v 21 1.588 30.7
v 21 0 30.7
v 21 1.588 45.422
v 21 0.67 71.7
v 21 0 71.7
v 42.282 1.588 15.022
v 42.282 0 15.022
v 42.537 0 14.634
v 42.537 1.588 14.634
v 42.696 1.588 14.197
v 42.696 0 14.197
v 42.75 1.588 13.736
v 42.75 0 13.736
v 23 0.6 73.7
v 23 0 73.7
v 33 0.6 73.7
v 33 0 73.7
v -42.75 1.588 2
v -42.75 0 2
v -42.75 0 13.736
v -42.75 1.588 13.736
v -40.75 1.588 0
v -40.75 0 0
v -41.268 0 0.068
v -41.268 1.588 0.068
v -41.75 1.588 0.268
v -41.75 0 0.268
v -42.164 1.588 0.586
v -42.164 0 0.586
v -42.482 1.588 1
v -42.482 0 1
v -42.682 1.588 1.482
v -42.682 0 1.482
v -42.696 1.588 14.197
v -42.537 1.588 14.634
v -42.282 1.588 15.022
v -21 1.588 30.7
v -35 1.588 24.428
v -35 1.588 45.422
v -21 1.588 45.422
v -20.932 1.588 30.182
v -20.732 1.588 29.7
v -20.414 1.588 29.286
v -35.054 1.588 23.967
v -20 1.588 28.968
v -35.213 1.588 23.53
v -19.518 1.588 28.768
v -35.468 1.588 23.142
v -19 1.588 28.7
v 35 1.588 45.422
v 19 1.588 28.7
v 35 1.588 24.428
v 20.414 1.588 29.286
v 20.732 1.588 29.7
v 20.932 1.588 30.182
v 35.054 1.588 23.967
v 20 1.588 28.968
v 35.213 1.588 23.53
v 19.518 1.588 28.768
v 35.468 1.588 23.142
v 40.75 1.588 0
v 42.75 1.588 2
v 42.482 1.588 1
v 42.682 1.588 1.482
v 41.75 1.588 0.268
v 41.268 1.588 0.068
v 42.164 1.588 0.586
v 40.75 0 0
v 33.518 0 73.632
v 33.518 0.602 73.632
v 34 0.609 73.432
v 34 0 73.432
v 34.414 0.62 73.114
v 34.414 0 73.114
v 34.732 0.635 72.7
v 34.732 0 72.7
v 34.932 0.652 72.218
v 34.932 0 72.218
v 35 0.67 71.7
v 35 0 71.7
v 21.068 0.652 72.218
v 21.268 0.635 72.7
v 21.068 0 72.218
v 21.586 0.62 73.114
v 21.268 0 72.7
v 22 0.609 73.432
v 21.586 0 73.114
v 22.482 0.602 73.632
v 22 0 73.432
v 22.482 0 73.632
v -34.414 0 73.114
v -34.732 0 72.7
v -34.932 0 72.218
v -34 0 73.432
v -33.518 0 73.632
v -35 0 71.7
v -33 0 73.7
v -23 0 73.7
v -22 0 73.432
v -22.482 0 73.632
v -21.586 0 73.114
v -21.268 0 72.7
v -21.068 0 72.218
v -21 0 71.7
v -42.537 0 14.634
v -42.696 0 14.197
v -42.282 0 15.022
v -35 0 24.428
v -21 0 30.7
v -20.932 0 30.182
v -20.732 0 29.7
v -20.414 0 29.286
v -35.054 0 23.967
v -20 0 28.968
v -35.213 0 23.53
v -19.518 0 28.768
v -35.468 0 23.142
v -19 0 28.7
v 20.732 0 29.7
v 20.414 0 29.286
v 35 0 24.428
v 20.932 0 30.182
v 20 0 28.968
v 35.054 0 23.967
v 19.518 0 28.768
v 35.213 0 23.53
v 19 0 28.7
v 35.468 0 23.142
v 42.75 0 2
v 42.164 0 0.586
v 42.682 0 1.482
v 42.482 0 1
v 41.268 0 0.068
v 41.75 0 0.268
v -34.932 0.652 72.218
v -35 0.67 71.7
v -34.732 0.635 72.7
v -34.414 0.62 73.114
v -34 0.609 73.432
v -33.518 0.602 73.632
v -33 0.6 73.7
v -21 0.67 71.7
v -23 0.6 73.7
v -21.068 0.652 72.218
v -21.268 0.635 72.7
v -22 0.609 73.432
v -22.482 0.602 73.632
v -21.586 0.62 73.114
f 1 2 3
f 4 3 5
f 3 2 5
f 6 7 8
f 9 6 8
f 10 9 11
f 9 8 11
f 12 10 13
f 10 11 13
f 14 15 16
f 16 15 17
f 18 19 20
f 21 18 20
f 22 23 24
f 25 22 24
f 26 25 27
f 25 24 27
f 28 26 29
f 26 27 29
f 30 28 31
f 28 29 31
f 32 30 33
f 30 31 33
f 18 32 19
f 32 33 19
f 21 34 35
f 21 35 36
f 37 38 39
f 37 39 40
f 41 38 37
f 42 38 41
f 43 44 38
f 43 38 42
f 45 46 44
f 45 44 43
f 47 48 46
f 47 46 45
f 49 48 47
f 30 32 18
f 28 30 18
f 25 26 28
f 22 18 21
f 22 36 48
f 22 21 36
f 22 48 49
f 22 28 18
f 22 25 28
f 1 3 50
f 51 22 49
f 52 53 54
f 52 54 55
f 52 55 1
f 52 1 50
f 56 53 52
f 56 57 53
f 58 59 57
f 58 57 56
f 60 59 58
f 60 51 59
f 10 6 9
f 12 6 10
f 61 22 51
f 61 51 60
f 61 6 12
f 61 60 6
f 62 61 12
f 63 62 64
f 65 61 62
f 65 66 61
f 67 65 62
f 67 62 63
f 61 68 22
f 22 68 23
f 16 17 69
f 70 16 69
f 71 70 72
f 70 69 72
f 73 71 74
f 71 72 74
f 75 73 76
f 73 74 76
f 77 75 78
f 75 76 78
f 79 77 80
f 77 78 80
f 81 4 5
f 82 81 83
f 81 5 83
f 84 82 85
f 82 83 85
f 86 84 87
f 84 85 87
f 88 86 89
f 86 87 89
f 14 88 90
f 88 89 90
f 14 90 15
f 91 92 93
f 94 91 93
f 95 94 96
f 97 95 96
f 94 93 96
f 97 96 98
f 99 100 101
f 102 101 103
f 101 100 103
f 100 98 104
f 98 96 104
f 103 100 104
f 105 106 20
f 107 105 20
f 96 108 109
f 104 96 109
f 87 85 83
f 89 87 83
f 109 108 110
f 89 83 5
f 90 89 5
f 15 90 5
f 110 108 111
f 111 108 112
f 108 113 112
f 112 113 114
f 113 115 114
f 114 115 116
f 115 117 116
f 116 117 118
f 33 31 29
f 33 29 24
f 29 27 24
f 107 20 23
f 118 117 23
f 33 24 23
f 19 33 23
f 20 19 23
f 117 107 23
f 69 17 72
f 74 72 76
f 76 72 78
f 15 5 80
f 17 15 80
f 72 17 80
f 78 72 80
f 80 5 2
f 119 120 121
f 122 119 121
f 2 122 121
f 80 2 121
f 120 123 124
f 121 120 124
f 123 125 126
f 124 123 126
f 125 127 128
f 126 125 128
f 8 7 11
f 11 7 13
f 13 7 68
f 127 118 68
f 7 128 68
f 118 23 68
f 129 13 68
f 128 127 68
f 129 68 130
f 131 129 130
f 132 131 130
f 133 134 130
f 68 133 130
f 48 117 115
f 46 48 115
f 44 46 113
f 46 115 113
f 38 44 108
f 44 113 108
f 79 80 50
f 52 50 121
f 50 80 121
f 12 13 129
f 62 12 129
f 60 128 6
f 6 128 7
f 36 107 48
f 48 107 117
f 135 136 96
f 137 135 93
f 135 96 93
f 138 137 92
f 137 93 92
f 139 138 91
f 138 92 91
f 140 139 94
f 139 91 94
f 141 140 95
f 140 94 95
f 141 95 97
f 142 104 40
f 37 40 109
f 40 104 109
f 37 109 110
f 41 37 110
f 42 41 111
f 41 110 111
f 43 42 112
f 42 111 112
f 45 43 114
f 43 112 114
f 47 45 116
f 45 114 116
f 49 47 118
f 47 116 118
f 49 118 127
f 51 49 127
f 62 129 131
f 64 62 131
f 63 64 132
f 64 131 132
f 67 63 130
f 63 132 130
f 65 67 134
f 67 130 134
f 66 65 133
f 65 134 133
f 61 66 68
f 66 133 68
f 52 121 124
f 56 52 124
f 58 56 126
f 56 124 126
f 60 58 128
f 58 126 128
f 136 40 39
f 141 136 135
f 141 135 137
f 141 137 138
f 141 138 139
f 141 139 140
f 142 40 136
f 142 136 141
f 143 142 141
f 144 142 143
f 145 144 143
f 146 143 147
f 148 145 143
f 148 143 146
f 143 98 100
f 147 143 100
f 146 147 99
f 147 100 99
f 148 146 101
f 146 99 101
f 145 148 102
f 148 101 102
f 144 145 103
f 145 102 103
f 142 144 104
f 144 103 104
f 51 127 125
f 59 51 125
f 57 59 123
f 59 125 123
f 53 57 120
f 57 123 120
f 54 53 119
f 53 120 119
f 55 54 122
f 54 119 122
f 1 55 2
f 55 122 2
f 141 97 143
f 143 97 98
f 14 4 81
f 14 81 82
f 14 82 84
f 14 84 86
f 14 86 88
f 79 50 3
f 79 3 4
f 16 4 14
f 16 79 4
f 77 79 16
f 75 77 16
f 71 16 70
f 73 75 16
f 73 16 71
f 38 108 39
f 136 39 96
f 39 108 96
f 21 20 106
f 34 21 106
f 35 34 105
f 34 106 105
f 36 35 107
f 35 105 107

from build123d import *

# Parameters (mm, degrees)
BOSS_EXTRUDE1_DEPTH = 1.5875
CUT_EXTRUDE2_DEPTH  = 109.601439476


with BuildPart() as part:
    # Sketch1 → Boss-Extrude1 (new body)
    with BuildSketch(Plane(origin=(0, 0, 0), x_dir=(1, 0, 0), z_dir=(0, 1, 0))):
        with BuildLine():
            Line((-35, -24.427940469), (-35, -71.7))
            ThreePointArc((-35, -71.7), (-34.414213562, -73.114213562), (-33, -73.7))
            Line((-33, -73.7), (-23, -73.7))
            ThreePointArc((-23, -73.7), (-21.585786438, -73.114213562), (-21, -71.7))
            Line((-21, -71.7), (-21, -30.7))
            ThreePointArc((-21, -30.7), (-20.414213562, -29.285786438), (-19, -28.7))
            Line((-19, -28.7), (19, -28.7))
            ThreePointArc((19, -28.7), (20.414213562, -29.285786438), (21, -30.7))
            Line((21, -30.7), (21, -71.7))
            ThreePointArc((21, -71.7), (21.585786438, -73.114213562), (23, -73.7))
            Line((23, -73.7), (33, -73.7))
            ThreePointArc((33, -73.7), (34.414213562, -73.114213562), (35, -71.7))
            Line((35, -71.7), (35, -24.427940469))
            ThreePointArc((35, -24.427940469), (35.120614758, -23.743900182), (35.467911114, -23.142365249))
            Line((35.467911114, -23.142365249), (42.282088886, -15.021544408))
            ThreePointArc((42.282088886, -15.021544408), (42.629385242, -14.420009476), (42.75, -13.735969189))
            Line((42.75, -13.735969189), (42.75, -2))
            ThreePointArc((42.75, -2), (42.164213562, -0.585786438), (40.75, 0))
            Line((40.75, 0), (-40.75, 0))
            ThreePointArc((-40.75, 0), (-42.164213562, -0.585786438), (-42.75, -2))
            Line((-42.75, -2), (-42.75, -13.735969189))
            ThreePointArc((-42.75, -13.735969189), (-42.629385242, -14.420009476), (-42.282088886, -15.021544408))
            Line((-42.282088886, -15.021544408), (-35.467911114, -23.142365249))
            ThreePointArc((-35.467911114, -23.142365249), (-35.120614758, -23.743900182), (-35, -24.427940469))
        make_face()
    extrude(amount=BOSS_EXTRUDE1_DEPTH)

    # Sketch3 → Cut-Extrude2 (cut, through all)
    with BuildSketch(Plane(origin=(37, 0, 0), x_dir=(0, 0, -1), z_dir=(1, 0, 0))):
        Polygon((-71.7, 1.5875), (-45.421699883, 1.5875), (-73.7, 0.6), (-73.7, 1.5875), align=None)
    extrude(amount=-CUT_EXTRUDE2_DEPTH, mode=Mode.SUBTRACT)


solid = part.part
